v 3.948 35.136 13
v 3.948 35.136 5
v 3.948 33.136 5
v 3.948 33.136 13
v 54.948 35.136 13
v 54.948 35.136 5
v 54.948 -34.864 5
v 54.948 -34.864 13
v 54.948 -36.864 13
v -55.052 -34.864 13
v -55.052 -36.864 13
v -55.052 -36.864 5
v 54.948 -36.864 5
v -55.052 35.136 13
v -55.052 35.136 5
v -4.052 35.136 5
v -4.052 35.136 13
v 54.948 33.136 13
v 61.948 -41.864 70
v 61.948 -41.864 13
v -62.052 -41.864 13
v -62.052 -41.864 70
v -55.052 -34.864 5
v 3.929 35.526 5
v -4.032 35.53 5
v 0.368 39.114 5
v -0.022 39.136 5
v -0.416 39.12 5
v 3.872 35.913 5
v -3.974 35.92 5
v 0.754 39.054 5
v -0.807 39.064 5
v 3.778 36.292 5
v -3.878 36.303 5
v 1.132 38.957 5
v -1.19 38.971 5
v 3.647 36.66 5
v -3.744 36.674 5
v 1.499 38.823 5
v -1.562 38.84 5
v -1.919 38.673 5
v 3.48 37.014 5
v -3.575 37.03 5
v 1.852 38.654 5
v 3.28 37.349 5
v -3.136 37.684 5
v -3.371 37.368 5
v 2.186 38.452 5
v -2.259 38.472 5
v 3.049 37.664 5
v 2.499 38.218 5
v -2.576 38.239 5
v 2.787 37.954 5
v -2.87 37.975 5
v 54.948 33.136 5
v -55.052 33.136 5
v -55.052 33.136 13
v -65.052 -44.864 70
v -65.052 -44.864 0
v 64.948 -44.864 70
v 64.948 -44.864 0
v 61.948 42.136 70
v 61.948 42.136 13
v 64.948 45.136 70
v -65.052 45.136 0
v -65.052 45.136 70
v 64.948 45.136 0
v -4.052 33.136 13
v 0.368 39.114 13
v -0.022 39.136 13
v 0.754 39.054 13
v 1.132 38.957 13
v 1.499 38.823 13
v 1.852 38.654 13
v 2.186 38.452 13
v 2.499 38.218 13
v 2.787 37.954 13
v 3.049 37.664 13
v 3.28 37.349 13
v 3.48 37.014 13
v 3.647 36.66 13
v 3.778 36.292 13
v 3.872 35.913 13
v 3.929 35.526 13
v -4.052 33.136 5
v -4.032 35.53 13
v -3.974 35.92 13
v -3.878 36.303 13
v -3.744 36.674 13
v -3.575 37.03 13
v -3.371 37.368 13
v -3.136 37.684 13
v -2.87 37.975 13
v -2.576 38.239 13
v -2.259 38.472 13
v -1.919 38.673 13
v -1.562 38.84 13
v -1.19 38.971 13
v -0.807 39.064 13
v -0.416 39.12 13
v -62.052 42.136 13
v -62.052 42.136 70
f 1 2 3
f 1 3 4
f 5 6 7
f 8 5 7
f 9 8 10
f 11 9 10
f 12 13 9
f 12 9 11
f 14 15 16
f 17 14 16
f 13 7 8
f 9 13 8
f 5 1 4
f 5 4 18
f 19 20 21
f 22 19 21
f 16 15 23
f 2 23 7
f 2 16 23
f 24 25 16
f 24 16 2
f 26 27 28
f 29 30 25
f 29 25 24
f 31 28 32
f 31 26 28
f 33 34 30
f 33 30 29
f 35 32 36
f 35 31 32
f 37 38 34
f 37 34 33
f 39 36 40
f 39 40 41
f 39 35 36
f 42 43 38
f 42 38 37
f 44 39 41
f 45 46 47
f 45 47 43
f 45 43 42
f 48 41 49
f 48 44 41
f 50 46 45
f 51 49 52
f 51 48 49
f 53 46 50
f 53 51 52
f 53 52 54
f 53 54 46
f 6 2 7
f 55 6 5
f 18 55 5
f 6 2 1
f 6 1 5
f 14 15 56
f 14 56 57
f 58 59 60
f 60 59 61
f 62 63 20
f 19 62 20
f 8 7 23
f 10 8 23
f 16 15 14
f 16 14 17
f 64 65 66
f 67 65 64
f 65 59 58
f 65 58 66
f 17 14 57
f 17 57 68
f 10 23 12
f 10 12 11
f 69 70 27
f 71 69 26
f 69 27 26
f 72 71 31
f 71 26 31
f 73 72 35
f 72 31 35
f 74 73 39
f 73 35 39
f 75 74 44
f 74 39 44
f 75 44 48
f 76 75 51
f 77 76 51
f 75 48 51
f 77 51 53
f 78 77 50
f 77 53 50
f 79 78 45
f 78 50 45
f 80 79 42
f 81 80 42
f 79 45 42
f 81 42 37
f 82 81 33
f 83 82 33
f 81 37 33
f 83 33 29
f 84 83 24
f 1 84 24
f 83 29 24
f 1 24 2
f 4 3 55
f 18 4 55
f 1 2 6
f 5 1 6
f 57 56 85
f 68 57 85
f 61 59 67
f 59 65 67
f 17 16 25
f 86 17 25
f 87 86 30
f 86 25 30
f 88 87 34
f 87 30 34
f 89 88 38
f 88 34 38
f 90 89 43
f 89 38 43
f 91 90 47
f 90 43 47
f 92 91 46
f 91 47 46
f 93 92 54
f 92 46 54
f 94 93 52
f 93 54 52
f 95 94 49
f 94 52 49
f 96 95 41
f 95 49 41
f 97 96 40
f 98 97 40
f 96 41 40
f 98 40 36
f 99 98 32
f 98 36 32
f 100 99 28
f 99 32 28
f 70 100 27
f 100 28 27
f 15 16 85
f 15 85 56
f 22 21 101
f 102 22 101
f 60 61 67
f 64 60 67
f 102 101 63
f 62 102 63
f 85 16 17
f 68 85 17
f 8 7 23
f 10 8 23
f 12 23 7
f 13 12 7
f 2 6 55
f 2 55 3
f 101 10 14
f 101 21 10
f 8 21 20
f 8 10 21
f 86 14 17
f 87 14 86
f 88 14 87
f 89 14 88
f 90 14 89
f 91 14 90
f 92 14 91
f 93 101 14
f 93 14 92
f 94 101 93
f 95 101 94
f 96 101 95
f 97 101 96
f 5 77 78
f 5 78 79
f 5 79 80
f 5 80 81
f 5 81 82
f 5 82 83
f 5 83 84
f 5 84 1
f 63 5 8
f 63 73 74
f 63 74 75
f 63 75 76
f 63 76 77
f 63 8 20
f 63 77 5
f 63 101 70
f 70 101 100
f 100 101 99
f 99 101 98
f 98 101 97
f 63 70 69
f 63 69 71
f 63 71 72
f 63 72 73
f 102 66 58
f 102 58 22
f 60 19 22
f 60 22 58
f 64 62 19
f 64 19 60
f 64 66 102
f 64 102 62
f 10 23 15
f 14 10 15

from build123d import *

# Parameters (mm, degrees)
F0_W     = 130
F0_H     = 90
F1_DEPTH = 70
F2_DEPTH = 13
F3_DEPTH = 5
F4_DEPTH = 2


with BuildPart() as f1:
    # F0 (on Top) → F1 (new body)
    with BuildSketch(Plane.XY):
        with Locations((-0.0516974905, 0.1362216124)):
            Rectangle(F0_W, F0_H)
        Polygon((-62.0516974905, 42.1362216124), (0, 42.1362216124), (61.9483025095, 42.1362216124), (61.9483025095, -41.8637783876), (-62.0516974905, -41.8637783876), align=None, mode=Mode.SUBTRACT)
    extrude(amount=F1_DEPTH)

    # F0 (on Top) → F2 (join)
    with BuildSketch(Plane.XY):
        Polygon((61.9483025095, 42.1362216124), (0, 42.1362216124), (-62.0516974905, 42.1362216124), (-62.0516974905, -41.8637783876), (61.9483025095, -41.8637783876), align=None)
        with BuildLine():
            Line((54.9483025095, 35.1362216124), (54.9483025095, -34.8637783876))
            Line((54.9483025095, -34.8637783876), (-55.0516974905, -34.8637783876))
            Line((-55.0516974905, -34.8637783876), (-55.0516974905, 35.1362216124))
            Line((-55.0516974905, 35.1362216124), (-4.0516974905, 35.1362216124))
            ThreePointArc((-4.0516974905, 35.1362216124), (-2.8696610752, 37.9750737105), (-0.022156873, 39.1361125299))
            ThreePointArc((-0.022156873, 39.1361125299), (2.7871546076, 37.9541851971), (3.9483025095, 35.1362216124))
            Line((3.9483025095, 35.1362216124), (54.9483025095, 35.1362216124))
        make_face(mode=Mode.SUBTRACT)
    extrude(amount=F2_DEPTH)

    # F0 (on Top) → F3 (join)
    with BuildSketch(Plane.XY):
        Polygon((-55.0516974905, -34.8637783876), (54.9483025095, -34.8637783876), (54.9483025095, 35.1362216124), (3.9483025095, 35.1362216124), (-0.0516974905, 35.1362216124), (-4.0516974905, 35.1362216124), (-55.0516974905, 35.1362216124), align=None)
        with BuildLine():
            ThreePointArc((-0.022156873, 39.1361125299), (-2.8696610752, 37.9750737105), (-4.0516974905, 35.1362216124))
            Line((-4.0516974905, 35.1362216124), (-0.0516974905, 35.1362216124))
            Line((-0.0516974905, 35.1362216124), (-0.022156873, 39.1361125299))
        make_face()
        with BuildLine():
            Line((-0.0516974905, 35.1362216124), (3.9483025095, 35.1362216124))
            ThreePointArc((3.9483025095, 35.1362216124), (2.7871546076, 37.9541851971), (-0.022156873, 39.1361125299))
            Line((-0.022156873, 39.1361125299), (-0.0516974905, 35.1362216124))
        make_face()
    extrude(amount=F3_DEPTH)


with BuildPart() as f4:
    # F4 (new): faces of the model
    f4_faces = [f1.part.faces().sort_by_distance(p)[0] for p in [
        (-29.5516974905, 35.1362216124, 9),
        (-0.0516974905, -34.8637783876, 9),
        (29.4483025095, 35.1362216124, 9),
    ]]
    extrude(f4_faces, amount=F4_DEPTH, dir=(0, -1, 0))


solid = Compound([f1.part, f4.part])
